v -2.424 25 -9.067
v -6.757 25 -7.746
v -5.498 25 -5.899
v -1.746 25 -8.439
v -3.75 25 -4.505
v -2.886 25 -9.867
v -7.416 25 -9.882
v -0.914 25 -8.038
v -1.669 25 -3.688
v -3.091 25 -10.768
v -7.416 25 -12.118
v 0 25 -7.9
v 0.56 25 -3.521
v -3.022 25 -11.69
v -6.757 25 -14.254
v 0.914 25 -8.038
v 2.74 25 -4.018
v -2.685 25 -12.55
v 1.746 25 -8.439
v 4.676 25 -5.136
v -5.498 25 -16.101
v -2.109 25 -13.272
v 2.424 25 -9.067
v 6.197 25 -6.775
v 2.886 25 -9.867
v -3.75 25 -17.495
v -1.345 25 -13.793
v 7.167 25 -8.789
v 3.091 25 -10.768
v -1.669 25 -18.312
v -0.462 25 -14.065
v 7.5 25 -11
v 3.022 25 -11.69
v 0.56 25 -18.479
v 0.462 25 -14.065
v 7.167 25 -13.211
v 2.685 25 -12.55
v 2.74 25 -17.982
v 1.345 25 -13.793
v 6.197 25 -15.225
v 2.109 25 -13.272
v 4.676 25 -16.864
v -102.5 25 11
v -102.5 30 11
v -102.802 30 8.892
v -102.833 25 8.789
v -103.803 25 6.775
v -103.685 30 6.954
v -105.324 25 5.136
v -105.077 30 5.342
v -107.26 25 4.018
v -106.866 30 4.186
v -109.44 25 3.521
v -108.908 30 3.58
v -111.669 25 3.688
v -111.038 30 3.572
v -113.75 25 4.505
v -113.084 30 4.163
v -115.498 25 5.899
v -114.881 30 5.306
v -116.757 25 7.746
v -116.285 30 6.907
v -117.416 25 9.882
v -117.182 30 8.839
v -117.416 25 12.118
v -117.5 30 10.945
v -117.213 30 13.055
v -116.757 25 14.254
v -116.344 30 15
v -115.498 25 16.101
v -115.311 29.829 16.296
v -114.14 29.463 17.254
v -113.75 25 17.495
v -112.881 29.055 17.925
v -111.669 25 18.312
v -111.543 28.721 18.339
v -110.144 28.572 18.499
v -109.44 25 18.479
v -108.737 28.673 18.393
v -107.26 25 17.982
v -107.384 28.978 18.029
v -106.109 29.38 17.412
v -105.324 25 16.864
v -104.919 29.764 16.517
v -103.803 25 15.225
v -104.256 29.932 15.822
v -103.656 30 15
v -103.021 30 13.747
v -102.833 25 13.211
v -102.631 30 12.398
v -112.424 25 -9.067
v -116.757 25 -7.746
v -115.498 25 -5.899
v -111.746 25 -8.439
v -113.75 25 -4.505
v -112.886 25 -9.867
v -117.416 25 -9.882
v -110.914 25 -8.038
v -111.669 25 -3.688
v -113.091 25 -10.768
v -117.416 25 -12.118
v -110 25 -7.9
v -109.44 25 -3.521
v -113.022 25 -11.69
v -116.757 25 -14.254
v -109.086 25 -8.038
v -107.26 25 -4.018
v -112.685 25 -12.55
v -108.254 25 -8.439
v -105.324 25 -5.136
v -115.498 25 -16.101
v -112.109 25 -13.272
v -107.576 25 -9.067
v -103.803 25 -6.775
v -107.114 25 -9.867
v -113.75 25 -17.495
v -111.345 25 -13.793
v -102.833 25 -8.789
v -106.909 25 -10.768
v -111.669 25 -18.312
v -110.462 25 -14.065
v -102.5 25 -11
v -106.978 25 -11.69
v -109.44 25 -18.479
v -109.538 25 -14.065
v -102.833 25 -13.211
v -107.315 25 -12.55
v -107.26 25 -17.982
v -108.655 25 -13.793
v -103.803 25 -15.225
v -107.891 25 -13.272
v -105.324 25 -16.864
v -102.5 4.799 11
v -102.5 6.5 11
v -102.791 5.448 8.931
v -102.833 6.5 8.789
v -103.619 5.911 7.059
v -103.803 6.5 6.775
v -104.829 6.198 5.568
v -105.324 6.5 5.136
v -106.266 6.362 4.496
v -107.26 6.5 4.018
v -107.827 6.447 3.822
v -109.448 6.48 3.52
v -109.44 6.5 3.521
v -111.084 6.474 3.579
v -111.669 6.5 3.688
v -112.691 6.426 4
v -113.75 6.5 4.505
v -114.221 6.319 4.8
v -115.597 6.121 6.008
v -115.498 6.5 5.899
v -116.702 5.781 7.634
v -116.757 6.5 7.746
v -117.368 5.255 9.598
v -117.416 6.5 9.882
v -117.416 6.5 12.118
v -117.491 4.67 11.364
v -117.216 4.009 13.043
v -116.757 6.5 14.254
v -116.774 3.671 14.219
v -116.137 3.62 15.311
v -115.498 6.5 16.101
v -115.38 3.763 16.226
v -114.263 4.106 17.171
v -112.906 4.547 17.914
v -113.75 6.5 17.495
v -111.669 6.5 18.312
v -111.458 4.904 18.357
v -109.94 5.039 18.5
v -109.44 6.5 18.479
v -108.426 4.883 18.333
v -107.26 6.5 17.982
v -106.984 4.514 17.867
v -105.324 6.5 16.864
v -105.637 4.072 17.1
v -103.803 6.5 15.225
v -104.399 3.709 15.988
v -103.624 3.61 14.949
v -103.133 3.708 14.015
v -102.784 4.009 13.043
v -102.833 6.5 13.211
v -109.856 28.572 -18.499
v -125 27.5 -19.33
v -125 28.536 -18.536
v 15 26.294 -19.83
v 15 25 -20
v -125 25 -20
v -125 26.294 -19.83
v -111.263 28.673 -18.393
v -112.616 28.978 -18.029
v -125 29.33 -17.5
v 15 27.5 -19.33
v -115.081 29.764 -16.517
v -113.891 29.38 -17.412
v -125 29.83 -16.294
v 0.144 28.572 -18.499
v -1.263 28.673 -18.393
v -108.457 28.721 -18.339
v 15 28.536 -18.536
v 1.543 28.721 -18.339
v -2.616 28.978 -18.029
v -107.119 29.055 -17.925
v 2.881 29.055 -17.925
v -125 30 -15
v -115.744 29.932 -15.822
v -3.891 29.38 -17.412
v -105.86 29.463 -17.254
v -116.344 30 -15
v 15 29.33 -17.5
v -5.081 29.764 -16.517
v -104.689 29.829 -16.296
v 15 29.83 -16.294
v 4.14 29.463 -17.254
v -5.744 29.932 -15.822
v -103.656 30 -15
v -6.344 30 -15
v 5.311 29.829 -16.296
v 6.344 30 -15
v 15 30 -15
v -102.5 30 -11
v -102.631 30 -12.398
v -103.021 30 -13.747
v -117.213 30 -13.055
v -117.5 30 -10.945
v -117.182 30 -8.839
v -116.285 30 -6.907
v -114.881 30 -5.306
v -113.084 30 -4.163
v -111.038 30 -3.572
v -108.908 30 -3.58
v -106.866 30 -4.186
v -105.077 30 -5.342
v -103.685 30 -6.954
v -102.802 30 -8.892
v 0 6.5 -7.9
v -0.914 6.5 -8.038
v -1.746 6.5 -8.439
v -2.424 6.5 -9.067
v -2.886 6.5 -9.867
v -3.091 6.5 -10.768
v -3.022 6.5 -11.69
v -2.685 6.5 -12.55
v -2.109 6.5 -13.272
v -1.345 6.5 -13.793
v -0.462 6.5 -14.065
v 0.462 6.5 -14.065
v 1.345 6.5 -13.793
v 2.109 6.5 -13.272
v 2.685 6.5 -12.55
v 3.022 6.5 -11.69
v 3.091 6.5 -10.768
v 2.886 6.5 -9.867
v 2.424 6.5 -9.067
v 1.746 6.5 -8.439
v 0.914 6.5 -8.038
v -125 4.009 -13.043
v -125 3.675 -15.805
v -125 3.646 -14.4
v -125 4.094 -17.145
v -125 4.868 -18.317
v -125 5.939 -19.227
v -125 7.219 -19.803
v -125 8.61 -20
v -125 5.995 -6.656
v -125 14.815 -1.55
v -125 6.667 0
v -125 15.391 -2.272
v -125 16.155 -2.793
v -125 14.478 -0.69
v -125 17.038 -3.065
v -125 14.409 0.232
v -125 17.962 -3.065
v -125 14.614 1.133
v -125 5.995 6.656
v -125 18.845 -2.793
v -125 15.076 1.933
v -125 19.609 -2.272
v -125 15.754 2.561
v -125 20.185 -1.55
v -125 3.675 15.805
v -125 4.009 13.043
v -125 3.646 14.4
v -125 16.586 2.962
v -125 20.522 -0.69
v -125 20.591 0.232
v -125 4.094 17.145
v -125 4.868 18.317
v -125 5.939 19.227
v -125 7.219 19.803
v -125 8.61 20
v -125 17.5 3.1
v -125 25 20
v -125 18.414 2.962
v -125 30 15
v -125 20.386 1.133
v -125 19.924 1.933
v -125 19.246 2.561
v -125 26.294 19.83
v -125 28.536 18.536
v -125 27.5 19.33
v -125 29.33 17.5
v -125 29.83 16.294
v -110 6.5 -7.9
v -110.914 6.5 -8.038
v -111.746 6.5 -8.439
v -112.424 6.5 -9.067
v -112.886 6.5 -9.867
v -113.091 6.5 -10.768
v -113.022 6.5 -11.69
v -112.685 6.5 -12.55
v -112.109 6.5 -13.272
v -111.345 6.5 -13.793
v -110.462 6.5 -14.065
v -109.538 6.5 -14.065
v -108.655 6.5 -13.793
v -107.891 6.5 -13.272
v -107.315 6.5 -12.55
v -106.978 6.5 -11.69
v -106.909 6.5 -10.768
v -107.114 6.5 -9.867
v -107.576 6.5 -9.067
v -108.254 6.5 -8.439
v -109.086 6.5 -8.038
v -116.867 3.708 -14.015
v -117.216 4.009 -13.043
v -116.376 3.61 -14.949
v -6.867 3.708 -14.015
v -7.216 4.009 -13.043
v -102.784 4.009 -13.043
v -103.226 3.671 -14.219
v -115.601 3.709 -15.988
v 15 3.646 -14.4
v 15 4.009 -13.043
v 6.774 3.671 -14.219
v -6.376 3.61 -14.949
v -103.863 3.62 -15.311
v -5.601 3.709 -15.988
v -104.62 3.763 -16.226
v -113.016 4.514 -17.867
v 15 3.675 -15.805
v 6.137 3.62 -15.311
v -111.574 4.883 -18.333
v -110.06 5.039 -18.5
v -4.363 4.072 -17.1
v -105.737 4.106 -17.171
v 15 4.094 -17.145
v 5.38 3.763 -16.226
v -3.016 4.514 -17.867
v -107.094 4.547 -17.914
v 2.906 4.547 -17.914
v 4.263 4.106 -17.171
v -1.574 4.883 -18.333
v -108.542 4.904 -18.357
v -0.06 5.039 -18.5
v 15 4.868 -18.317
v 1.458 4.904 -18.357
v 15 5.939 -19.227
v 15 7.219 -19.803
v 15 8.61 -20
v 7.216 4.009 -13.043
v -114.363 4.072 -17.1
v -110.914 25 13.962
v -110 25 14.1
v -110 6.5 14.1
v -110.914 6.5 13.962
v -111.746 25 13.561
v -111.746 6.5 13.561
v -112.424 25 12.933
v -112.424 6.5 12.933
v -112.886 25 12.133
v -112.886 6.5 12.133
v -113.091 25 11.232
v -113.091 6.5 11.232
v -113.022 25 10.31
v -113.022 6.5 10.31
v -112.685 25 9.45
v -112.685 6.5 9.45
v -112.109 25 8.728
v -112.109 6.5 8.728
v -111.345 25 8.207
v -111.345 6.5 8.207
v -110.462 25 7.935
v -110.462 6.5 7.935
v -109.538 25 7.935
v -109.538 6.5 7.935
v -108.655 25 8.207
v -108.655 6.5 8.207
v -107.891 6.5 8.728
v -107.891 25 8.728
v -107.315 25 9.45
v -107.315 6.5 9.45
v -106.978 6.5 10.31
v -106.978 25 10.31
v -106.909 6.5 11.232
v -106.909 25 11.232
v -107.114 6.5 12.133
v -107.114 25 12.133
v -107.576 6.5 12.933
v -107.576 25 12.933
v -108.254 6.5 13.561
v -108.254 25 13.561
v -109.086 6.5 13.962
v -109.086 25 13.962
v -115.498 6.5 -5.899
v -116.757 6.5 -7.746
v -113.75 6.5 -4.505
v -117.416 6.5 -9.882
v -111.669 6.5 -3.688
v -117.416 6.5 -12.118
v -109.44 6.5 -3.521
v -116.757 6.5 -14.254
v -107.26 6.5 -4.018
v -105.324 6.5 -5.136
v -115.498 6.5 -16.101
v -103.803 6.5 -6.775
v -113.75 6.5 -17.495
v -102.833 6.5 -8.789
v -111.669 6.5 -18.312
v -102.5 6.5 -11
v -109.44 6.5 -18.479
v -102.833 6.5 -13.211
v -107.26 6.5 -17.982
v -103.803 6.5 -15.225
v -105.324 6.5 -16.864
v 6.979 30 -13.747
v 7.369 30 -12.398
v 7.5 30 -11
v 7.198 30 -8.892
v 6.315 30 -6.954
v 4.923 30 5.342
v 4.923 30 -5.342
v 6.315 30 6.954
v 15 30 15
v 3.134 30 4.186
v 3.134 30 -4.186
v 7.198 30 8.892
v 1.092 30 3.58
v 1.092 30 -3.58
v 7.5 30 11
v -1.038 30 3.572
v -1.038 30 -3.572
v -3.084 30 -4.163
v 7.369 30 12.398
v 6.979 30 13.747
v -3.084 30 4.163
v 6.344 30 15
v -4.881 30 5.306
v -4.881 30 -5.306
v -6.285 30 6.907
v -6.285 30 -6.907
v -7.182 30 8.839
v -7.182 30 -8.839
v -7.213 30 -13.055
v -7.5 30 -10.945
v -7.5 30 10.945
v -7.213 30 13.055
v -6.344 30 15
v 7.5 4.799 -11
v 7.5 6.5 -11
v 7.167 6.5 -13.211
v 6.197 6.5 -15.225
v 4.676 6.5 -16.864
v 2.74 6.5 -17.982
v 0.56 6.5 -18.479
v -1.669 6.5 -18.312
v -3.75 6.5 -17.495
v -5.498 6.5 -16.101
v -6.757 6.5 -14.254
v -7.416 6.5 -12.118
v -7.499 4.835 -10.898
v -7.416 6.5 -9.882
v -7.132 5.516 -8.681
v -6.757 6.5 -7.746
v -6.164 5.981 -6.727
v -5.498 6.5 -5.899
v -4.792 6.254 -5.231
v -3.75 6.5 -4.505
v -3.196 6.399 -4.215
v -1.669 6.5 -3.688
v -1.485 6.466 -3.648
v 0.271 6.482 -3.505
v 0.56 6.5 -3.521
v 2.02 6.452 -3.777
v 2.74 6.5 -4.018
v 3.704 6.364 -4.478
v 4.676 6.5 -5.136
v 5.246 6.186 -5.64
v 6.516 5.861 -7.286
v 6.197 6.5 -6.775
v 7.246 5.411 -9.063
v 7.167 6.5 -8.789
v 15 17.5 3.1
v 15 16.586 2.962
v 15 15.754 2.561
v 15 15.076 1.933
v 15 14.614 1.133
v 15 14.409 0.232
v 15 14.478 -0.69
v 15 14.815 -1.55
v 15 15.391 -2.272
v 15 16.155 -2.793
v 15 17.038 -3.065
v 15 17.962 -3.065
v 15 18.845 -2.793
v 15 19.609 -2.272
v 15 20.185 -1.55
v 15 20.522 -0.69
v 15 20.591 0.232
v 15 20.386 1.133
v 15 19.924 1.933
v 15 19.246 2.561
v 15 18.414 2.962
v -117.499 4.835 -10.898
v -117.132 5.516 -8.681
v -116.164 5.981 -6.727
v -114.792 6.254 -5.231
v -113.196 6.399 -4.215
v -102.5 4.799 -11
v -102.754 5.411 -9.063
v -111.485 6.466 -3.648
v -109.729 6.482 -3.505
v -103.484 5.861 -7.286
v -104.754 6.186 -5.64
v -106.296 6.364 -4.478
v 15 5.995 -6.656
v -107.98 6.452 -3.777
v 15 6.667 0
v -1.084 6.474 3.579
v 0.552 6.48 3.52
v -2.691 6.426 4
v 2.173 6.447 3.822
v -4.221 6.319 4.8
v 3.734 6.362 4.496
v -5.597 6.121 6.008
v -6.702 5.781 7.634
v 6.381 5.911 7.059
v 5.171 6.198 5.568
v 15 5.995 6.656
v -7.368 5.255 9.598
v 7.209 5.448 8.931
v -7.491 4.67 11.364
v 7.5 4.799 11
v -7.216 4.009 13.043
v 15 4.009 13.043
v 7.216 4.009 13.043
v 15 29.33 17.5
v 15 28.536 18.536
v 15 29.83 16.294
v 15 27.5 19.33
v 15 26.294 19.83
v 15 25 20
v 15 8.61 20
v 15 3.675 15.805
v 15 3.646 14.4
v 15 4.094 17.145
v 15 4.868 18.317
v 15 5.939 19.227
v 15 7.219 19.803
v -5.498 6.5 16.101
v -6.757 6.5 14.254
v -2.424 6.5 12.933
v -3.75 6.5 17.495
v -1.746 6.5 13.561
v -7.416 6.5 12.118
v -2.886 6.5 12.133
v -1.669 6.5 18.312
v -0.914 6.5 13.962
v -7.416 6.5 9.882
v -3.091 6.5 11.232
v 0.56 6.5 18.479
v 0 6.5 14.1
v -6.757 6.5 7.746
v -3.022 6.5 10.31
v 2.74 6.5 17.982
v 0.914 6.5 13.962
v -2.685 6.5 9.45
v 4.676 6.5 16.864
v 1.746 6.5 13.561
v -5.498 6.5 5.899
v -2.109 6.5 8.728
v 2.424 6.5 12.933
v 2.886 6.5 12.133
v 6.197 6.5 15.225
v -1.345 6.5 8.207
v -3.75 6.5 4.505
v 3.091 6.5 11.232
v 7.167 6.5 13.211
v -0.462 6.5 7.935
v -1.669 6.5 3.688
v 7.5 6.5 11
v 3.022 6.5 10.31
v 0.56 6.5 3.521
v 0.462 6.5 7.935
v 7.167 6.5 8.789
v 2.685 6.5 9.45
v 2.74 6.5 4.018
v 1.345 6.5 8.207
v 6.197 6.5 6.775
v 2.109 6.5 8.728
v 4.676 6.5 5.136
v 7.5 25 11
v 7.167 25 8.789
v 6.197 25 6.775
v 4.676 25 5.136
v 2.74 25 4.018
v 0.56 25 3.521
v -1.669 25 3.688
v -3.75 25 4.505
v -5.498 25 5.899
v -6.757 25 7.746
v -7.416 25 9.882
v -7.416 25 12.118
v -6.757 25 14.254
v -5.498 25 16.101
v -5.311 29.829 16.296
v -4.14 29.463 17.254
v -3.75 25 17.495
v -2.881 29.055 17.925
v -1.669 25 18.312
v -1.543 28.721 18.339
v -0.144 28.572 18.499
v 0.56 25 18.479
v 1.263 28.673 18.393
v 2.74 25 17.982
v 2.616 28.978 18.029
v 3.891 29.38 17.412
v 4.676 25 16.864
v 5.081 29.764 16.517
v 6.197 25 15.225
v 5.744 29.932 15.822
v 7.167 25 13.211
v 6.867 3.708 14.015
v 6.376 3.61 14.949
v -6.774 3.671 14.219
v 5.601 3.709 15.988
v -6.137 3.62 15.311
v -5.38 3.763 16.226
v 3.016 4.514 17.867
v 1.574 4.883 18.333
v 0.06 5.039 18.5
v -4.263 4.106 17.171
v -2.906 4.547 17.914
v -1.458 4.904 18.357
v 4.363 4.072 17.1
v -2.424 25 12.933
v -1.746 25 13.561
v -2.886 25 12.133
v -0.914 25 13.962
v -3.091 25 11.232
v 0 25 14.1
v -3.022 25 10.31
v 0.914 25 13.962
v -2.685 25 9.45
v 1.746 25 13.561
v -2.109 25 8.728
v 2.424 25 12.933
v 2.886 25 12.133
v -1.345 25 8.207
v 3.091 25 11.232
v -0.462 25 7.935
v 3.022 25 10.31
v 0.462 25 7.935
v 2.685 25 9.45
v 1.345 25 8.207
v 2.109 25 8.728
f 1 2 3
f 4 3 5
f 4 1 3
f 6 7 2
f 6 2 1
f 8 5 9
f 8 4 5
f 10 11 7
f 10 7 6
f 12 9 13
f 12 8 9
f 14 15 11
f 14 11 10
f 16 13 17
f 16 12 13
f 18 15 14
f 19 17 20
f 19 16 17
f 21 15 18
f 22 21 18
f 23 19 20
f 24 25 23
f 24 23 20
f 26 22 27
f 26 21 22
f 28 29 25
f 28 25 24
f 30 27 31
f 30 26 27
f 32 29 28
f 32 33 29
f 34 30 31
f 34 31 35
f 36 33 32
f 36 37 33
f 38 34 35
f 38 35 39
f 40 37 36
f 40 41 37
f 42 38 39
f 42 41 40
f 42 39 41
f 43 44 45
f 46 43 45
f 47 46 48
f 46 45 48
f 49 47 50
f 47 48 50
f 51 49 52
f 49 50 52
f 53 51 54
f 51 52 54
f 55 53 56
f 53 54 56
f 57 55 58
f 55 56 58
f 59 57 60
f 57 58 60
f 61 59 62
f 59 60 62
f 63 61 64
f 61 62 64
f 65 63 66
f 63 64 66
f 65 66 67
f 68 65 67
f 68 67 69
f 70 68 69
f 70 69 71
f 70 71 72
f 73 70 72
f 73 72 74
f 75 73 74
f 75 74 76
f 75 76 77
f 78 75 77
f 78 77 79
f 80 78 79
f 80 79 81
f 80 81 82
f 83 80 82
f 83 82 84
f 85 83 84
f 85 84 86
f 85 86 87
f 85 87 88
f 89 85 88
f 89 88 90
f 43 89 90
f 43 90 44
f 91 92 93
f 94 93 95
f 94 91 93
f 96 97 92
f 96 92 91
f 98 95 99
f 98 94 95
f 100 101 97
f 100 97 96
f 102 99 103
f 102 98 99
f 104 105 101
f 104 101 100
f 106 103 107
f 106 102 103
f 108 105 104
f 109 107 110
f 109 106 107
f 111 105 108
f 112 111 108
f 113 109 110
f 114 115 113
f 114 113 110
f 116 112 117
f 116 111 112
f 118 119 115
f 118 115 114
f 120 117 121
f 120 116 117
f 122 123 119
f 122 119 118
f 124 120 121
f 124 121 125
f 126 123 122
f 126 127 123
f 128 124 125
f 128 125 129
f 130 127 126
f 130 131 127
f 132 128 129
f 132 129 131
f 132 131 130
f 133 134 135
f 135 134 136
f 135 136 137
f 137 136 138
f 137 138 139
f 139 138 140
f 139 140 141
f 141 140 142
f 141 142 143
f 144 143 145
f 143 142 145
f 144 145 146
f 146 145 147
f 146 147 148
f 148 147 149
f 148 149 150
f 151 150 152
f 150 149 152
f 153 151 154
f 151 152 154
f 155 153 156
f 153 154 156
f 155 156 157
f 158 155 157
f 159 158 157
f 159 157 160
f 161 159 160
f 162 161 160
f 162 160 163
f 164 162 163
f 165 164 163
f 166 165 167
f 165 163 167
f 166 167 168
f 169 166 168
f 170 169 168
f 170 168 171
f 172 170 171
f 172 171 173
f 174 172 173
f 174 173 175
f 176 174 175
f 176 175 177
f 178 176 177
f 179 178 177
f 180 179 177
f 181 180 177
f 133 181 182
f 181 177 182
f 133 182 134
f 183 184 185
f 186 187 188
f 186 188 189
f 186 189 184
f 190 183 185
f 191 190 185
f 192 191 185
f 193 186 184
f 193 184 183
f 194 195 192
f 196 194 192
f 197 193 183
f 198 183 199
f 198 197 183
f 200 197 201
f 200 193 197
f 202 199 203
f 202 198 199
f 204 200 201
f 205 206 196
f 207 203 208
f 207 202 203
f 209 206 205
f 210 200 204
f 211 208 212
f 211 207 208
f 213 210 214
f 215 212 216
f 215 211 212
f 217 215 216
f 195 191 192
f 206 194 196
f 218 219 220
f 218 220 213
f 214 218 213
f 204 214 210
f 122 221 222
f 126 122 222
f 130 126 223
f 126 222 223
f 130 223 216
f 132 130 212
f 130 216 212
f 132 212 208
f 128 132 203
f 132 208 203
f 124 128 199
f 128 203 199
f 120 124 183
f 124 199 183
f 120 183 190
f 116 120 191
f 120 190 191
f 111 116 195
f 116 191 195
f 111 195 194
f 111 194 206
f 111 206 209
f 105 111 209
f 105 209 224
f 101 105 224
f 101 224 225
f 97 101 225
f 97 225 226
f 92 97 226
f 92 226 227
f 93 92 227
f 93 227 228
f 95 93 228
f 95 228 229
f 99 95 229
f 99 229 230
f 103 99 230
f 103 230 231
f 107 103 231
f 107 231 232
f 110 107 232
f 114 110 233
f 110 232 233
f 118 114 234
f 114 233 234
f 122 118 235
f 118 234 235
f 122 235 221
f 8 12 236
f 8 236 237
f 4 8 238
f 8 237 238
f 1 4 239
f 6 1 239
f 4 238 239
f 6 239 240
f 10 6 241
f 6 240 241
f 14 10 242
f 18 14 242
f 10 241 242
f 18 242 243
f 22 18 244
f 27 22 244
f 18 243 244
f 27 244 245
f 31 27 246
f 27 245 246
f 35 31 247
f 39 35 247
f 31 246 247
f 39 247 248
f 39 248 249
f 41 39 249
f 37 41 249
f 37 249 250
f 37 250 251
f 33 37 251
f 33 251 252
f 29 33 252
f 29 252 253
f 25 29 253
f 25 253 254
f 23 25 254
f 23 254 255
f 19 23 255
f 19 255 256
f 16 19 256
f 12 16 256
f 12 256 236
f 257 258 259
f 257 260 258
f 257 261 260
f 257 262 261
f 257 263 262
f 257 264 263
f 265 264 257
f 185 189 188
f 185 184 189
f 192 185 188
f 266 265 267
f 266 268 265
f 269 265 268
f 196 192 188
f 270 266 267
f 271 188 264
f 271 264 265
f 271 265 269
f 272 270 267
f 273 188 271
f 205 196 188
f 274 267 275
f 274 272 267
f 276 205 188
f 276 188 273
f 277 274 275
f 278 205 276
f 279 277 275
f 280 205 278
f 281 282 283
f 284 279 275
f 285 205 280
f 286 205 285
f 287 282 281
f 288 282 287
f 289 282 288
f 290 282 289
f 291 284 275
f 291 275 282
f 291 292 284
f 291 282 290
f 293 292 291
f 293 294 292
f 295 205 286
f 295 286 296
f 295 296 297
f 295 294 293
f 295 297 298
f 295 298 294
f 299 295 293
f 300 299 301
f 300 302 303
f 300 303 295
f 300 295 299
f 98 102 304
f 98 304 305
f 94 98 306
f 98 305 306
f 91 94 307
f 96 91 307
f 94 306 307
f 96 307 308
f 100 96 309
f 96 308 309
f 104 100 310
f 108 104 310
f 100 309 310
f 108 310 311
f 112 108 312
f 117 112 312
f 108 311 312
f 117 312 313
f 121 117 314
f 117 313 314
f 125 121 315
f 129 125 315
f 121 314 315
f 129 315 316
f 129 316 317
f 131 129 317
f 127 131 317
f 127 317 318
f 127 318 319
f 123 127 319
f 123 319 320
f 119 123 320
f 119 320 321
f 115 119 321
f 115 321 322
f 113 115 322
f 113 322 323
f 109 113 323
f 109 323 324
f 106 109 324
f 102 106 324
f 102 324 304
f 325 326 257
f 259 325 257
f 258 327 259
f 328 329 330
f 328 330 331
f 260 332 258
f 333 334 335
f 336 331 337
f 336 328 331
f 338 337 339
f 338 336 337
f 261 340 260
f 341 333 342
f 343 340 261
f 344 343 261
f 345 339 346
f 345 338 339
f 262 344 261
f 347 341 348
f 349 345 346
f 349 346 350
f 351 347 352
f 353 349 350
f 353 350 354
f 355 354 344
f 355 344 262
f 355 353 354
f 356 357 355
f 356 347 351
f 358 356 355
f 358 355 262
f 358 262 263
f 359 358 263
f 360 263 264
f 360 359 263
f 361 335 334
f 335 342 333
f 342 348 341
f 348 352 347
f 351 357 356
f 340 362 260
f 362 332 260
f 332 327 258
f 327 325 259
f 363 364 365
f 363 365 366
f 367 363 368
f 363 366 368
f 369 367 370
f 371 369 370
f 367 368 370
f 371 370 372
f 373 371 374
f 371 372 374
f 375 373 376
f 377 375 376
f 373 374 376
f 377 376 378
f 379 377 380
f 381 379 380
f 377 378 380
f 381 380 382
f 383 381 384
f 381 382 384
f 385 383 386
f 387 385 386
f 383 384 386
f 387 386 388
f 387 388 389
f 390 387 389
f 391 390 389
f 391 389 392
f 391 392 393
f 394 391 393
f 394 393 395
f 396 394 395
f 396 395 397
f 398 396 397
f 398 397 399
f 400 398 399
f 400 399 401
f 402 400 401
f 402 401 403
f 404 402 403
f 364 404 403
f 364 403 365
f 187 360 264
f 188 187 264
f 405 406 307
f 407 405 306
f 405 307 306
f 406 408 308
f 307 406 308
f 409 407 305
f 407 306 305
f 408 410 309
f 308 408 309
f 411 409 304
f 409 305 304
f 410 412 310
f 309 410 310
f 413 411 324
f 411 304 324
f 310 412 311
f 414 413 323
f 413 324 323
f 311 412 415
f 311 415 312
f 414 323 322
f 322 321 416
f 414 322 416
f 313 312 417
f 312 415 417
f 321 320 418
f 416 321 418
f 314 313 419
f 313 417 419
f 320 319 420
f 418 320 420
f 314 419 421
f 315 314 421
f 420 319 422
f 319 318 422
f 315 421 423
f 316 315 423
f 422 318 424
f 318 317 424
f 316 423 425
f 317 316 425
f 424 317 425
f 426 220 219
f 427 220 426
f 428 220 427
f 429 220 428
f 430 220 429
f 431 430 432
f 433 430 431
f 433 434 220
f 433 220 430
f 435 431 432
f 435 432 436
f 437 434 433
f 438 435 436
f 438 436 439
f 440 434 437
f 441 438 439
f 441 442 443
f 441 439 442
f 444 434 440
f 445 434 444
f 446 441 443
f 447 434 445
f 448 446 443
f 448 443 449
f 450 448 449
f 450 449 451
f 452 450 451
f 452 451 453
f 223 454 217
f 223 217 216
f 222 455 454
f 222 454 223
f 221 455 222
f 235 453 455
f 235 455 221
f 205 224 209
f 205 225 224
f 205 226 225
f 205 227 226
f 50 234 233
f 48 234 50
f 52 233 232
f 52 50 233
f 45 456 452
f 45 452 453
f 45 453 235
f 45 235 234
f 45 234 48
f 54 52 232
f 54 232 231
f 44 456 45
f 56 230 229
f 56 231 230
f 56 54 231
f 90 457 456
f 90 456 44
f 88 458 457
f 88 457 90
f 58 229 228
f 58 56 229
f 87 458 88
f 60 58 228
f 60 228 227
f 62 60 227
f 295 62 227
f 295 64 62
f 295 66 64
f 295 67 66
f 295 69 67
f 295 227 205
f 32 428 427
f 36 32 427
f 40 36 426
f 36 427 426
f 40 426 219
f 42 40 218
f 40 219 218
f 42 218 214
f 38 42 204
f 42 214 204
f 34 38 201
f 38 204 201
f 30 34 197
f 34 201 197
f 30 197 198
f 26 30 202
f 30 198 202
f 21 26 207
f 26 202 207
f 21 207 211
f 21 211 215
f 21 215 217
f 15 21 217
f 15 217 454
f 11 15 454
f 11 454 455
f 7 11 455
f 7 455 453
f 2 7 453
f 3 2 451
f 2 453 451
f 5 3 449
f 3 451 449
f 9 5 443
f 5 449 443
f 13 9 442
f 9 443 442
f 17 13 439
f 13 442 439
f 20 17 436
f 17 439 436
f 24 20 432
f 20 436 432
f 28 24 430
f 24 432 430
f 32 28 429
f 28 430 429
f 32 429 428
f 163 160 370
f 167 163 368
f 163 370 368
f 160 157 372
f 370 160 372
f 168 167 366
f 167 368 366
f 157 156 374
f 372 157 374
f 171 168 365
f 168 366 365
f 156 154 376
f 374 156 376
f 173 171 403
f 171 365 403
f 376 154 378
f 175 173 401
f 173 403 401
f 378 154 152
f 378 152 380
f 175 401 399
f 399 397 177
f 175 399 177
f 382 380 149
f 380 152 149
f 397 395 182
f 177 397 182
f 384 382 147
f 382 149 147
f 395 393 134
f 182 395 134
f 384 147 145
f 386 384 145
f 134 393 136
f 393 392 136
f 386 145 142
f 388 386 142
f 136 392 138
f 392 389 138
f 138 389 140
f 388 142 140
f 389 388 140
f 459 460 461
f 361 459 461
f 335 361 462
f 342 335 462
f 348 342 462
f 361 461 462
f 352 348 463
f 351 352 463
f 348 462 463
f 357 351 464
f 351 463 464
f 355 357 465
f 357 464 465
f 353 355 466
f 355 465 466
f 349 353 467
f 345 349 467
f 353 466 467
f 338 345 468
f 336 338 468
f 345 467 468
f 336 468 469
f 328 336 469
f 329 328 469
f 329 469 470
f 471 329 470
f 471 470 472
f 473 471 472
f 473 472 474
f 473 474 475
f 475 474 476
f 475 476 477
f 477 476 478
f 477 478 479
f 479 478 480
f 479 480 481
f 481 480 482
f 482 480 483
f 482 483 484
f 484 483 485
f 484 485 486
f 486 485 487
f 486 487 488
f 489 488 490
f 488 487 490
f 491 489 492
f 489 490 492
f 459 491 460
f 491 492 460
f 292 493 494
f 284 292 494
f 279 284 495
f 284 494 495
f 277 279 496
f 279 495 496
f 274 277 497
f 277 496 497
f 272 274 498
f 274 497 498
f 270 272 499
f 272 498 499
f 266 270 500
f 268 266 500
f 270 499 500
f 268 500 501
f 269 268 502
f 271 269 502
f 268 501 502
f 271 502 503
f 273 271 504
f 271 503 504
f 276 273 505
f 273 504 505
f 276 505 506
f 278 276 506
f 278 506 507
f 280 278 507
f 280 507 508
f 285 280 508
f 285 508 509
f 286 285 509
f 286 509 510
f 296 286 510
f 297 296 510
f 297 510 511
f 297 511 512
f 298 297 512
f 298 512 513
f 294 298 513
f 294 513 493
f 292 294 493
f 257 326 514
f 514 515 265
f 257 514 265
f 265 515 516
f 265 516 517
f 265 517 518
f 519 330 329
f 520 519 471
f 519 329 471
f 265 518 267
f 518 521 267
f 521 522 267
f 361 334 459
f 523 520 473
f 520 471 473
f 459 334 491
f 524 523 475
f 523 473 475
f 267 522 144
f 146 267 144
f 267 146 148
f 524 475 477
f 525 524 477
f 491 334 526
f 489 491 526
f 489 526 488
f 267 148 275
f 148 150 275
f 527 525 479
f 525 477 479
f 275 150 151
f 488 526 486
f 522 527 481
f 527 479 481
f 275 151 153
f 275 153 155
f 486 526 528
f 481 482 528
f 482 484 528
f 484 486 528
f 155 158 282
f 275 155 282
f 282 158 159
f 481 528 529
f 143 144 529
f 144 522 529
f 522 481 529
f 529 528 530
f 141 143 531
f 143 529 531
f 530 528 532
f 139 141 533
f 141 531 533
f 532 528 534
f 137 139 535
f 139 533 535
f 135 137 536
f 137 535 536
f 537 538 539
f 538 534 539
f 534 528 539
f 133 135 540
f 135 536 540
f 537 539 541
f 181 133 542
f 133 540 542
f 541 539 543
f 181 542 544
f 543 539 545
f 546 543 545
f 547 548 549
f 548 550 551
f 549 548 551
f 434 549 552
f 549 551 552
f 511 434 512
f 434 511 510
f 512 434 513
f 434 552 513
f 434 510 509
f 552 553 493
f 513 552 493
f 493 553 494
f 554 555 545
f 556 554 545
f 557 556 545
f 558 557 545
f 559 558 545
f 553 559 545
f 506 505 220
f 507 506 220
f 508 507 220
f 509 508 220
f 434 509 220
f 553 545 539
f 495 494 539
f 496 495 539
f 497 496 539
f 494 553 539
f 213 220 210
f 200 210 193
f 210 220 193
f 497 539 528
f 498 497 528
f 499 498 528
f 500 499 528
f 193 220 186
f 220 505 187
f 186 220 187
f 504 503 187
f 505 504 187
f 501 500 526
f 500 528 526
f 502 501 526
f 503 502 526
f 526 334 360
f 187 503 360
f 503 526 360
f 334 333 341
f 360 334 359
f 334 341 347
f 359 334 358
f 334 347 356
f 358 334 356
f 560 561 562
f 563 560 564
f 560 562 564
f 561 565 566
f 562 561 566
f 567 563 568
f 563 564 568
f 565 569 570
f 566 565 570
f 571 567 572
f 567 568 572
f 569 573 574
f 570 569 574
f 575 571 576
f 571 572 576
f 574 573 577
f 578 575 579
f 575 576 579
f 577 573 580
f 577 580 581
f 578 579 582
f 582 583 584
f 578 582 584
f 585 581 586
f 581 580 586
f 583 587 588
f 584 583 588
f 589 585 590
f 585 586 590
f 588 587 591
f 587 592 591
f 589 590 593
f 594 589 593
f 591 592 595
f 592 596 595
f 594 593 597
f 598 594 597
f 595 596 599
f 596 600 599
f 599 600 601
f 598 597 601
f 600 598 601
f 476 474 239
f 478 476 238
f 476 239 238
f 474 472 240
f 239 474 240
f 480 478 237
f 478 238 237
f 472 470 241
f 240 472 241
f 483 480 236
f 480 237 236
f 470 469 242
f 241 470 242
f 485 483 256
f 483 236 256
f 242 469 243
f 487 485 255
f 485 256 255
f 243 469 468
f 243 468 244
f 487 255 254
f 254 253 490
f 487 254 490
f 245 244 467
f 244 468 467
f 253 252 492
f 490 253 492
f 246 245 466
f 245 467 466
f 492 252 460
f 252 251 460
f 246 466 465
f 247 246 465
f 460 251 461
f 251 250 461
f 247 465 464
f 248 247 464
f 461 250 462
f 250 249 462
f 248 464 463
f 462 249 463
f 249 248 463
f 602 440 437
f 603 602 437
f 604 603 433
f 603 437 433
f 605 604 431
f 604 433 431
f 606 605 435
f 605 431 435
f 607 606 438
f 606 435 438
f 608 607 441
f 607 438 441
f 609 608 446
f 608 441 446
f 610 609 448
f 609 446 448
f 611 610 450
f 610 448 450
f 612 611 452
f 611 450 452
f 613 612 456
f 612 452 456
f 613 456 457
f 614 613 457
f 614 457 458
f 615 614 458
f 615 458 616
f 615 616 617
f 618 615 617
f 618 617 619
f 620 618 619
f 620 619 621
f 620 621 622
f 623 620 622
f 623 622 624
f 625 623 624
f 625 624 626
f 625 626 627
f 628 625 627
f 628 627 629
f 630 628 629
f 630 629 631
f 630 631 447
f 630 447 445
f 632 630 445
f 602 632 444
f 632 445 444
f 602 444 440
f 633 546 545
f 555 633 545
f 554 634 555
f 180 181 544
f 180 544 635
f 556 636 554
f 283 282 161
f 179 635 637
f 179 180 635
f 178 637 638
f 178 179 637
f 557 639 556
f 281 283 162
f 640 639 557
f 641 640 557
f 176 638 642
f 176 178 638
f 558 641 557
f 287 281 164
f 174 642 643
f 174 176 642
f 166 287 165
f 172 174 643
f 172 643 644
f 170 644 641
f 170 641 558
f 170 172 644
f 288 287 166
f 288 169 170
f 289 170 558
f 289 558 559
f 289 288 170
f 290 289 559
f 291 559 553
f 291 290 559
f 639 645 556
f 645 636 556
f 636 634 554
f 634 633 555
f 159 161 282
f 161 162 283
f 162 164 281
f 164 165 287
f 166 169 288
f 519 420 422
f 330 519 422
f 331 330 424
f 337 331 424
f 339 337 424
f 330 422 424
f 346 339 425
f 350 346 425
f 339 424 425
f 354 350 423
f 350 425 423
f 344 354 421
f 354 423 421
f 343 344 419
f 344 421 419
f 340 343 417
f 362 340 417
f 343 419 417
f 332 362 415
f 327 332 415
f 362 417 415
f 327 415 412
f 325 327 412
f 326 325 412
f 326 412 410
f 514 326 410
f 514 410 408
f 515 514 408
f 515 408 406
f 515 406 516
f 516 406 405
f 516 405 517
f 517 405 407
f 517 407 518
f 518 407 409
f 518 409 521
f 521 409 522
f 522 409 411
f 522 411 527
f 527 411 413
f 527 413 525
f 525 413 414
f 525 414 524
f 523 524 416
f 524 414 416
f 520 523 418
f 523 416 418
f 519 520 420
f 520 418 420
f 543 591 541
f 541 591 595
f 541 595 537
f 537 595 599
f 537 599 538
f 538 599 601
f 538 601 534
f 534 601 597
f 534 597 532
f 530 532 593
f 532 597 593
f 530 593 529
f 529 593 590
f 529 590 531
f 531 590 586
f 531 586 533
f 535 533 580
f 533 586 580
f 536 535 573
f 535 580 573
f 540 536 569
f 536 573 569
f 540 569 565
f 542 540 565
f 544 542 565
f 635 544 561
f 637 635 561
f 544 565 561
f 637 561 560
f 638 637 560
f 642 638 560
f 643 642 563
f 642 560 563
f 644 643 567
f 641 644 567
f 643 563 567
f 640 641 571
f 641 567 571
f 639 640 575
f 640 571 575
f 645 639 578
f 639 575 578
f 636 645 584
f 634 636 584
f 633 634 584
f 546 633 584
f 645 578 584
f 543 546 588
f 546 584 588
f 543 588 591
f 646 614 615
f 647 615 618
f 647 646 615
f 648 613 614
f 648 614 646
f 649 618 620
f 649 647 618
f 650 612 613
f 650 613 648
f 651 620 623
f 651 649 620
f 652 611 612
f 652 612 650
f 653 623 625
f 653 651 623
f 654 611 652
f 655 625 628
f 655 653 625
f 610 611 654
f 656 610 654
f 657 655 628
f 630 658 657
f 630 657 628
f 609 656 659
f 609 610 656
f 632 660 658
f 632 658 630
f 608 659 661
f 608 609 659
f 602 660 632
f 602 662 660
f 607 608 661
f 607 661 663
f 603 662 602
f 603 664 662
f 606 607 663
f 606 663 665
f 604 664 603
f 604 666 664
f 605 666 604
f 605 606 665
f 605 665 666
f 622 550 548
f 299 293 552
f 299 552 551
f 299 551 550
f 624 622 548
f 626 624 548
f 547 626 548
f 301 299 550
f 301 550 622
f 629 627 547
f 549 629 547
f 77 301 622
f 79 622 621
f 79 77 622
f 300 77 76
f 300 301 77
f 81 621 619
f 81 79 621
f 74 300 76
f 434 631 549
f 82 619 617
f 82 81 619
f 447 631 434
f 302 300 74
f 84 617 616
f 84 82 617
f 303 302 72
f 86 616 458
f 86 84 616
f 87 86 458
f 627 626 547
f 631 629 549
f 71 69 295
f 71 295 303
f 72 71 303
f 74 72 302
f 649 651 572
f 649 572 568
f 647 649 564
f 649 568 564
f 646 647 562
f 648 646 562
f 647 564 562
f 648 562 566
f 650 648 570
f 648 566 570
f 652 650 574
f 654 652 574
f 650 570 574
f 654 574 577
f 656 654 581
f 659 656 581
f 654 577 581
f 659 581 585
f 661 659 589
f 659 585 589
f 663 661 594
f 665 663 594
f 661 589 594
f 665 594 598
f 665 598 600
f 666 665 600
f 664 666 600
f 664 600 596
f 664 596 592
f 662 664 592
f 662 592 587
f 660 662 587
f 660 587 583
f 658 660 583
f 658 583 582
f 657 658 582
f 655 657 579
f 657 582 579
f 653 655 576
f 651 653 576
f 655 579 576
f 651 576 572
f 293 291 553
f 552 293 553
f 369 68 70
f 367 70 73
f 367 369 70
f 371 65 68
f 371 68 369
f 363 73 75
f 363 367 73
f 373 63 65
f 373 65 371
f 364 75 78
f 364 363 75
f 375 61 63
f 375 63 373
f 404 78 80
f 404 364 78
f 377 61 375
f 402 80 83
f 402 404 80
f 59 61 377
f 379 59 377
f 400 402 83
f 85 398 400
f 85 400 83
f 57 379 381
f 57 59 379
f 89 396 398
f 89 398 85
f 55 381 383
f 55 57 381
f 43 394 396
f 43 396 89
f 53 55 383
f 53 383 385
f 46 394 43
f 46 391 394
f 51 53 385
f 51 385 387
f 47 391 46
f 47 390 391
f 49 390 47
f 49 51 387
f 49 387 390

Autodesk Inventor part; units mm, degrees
ref_plane "YZ Plane" through (0, 0, 0) normal (1, 0, 0) x (0, 1, 0)
ref_plane "XZ Plane" through (0, 0, 0) normal (0, 1, 0) x (-1, 0, 0)
ref_plane "XY Plane" through (0, 0, 0) normal (0, 0, 1) x (1, 0, 0)
sketch "Szkic1" plane through (0, 0, 0) normal (0, 1, 0) x (-1, 0, 0)
  line L0 (15, 20) -> (-15, 20)
  line L1 (-15, 20) -> (-15, -20)
  line L2 (-15, -20) -> (15, -20)
  line L3 (15, -20) -> (15, 20)
  line L4 (15, 20) -> (-15, -20) construction
  line L5 (-15, 20) -> (15, -20) construction
  line L6 (0, -28) -> (0, 28) construction
  line L7 (21, 0) -> (-21, 0) construction
  point P0 (0, 0)
  dimension "d0" = 30
  dimension "d1" = 40
extrude "Wyciągnięcie proste1" add sketch "Szkic1" along normal blind 30
sketch "Szkic2" plane through (-15, 0, -20) normal (-1, 0, 0) x (0, 0, 1)
  line L0 (-8, 0) -> (48, 0) construction
  line L1 (20, -6) -> (20, 36) construction
  line L2 (40, 30) -> (0, 30)
  line L3 (0, 30) -> (0, 0)
  line L4 (0, 0) -> (40, 0)
  line L5 (40, 0) -> (40, 30)
  line L6 (40, 30) -> (0, 0) construction
  line L7 (0, 30) -> (40, 0) construction
  line L8 (0, 0) -> (40, 0) projected
  arc A0 (40, 0) -> (0, 0) centre (20, -26.6667) ccw
  point P0 (20, 0)
  point P1 (20, 15)
  point P2 (20, 0)
  point P3 (0, 0)
  point P4 (0, 0)
  dimension "d4" = 40
  dimension "d5" = 30
  dimension "d6" = 15
extrude "Wyciągnięcie proste2" add sketch "Szkic2" along normal blind 110 contours L5 A0 L3 L2
extrude "Wyciągnięcie proste3" cut sketch "Szkic2" along normal through all both and the other way through all contours L4 A0
fillet "Zaokrąglenie1" radius 5 5 edges at (0, 0, 20) (-70, 0, 20) (0, 0, -20) (-55, 30, 20) (-55, 30, -20)
sketch "Szkic3" plane through (0, 30, 0) normal (0, 1, 0) x (1, 0, 0)
  line L0 (-153, 0) -> (43, 0) construction
  line L1 (0, 28) -> (0, -28) construction
  circle A0 centre (0, 11) radius 7.5
  circle A1 centre (0, 11) radius 3.05
  circle A2 centre (0, -11) radius 7.5
  circle A3 centre (0, -11) radius 3.05
  line L2 (0, 0) -> (-55, 0) construction
  line L3 (-125, 15) -> (15, 15) construction
  line L4 (-55, 0) -> (-55, 30) construction
  circle A4 centre (-110, 11) radius 7.5
  circle A5 centre (-110, 11) radius 3.05
  circle A6 centre (-110, -11) radius 7.5
  circle A7 centre (-110, -11) radius 3.05
  dimension "d12" = 15
  dimension "d13" = 6.1
  dimension "d14" = 11
  dimension "d21" = 55
  dimension "d23" = 30
extrude "Wyciągnięcie proste4" cut sketch "Szkic3" against normal through all contours A0 | A1 | A2 | A3 | A4 | A5 | A6 | A7
extrude "Wyciągnięcie proste5" add sketch "Szkic3" against normal blind 23.5
extrude "Wyciągnięcie proste6" cut sketch "Szkic3" against normal blind 5
sketch "Szkic5" plane through (0, 30, 0) normal (0, 1, 0) x (1, 0, 0)
  point P0 (0, 0)
sketch "Szkic6" plane through (-125, 0, -20) normal (-1, 0, 0) x (0, 0, 1)
  line L0 (-8, 0) -> (48, 0) construction
  line L1 (20, -6.0006) -> (20, 36.0033) construction
  circle A0 centre (20, 17.5) radius 7.5
  circle A1 centre (20, 17.5) radius 3.05
  point P0 (20, 0)
  dimension "d24" = 15
  dimension "d25" = 6.1
  dimension "d26" = 17.5
extrude "Wyciągnięcie proste7" cut sketch "Szkic6" against normal through all contours A1
hole "Otwór1" at (-110, 30, 11) at (-110, 30, -11) at (0, 30, 11) at (0, 30, -11) direction (0, -1, 0) diameter 6.2 end through all
hole "Otwór2" at (-125, 17.5, 0) direction (1, 0, 0) diameter 6.2 end through all
properties part number "uMule-ogranicznik_koła"
